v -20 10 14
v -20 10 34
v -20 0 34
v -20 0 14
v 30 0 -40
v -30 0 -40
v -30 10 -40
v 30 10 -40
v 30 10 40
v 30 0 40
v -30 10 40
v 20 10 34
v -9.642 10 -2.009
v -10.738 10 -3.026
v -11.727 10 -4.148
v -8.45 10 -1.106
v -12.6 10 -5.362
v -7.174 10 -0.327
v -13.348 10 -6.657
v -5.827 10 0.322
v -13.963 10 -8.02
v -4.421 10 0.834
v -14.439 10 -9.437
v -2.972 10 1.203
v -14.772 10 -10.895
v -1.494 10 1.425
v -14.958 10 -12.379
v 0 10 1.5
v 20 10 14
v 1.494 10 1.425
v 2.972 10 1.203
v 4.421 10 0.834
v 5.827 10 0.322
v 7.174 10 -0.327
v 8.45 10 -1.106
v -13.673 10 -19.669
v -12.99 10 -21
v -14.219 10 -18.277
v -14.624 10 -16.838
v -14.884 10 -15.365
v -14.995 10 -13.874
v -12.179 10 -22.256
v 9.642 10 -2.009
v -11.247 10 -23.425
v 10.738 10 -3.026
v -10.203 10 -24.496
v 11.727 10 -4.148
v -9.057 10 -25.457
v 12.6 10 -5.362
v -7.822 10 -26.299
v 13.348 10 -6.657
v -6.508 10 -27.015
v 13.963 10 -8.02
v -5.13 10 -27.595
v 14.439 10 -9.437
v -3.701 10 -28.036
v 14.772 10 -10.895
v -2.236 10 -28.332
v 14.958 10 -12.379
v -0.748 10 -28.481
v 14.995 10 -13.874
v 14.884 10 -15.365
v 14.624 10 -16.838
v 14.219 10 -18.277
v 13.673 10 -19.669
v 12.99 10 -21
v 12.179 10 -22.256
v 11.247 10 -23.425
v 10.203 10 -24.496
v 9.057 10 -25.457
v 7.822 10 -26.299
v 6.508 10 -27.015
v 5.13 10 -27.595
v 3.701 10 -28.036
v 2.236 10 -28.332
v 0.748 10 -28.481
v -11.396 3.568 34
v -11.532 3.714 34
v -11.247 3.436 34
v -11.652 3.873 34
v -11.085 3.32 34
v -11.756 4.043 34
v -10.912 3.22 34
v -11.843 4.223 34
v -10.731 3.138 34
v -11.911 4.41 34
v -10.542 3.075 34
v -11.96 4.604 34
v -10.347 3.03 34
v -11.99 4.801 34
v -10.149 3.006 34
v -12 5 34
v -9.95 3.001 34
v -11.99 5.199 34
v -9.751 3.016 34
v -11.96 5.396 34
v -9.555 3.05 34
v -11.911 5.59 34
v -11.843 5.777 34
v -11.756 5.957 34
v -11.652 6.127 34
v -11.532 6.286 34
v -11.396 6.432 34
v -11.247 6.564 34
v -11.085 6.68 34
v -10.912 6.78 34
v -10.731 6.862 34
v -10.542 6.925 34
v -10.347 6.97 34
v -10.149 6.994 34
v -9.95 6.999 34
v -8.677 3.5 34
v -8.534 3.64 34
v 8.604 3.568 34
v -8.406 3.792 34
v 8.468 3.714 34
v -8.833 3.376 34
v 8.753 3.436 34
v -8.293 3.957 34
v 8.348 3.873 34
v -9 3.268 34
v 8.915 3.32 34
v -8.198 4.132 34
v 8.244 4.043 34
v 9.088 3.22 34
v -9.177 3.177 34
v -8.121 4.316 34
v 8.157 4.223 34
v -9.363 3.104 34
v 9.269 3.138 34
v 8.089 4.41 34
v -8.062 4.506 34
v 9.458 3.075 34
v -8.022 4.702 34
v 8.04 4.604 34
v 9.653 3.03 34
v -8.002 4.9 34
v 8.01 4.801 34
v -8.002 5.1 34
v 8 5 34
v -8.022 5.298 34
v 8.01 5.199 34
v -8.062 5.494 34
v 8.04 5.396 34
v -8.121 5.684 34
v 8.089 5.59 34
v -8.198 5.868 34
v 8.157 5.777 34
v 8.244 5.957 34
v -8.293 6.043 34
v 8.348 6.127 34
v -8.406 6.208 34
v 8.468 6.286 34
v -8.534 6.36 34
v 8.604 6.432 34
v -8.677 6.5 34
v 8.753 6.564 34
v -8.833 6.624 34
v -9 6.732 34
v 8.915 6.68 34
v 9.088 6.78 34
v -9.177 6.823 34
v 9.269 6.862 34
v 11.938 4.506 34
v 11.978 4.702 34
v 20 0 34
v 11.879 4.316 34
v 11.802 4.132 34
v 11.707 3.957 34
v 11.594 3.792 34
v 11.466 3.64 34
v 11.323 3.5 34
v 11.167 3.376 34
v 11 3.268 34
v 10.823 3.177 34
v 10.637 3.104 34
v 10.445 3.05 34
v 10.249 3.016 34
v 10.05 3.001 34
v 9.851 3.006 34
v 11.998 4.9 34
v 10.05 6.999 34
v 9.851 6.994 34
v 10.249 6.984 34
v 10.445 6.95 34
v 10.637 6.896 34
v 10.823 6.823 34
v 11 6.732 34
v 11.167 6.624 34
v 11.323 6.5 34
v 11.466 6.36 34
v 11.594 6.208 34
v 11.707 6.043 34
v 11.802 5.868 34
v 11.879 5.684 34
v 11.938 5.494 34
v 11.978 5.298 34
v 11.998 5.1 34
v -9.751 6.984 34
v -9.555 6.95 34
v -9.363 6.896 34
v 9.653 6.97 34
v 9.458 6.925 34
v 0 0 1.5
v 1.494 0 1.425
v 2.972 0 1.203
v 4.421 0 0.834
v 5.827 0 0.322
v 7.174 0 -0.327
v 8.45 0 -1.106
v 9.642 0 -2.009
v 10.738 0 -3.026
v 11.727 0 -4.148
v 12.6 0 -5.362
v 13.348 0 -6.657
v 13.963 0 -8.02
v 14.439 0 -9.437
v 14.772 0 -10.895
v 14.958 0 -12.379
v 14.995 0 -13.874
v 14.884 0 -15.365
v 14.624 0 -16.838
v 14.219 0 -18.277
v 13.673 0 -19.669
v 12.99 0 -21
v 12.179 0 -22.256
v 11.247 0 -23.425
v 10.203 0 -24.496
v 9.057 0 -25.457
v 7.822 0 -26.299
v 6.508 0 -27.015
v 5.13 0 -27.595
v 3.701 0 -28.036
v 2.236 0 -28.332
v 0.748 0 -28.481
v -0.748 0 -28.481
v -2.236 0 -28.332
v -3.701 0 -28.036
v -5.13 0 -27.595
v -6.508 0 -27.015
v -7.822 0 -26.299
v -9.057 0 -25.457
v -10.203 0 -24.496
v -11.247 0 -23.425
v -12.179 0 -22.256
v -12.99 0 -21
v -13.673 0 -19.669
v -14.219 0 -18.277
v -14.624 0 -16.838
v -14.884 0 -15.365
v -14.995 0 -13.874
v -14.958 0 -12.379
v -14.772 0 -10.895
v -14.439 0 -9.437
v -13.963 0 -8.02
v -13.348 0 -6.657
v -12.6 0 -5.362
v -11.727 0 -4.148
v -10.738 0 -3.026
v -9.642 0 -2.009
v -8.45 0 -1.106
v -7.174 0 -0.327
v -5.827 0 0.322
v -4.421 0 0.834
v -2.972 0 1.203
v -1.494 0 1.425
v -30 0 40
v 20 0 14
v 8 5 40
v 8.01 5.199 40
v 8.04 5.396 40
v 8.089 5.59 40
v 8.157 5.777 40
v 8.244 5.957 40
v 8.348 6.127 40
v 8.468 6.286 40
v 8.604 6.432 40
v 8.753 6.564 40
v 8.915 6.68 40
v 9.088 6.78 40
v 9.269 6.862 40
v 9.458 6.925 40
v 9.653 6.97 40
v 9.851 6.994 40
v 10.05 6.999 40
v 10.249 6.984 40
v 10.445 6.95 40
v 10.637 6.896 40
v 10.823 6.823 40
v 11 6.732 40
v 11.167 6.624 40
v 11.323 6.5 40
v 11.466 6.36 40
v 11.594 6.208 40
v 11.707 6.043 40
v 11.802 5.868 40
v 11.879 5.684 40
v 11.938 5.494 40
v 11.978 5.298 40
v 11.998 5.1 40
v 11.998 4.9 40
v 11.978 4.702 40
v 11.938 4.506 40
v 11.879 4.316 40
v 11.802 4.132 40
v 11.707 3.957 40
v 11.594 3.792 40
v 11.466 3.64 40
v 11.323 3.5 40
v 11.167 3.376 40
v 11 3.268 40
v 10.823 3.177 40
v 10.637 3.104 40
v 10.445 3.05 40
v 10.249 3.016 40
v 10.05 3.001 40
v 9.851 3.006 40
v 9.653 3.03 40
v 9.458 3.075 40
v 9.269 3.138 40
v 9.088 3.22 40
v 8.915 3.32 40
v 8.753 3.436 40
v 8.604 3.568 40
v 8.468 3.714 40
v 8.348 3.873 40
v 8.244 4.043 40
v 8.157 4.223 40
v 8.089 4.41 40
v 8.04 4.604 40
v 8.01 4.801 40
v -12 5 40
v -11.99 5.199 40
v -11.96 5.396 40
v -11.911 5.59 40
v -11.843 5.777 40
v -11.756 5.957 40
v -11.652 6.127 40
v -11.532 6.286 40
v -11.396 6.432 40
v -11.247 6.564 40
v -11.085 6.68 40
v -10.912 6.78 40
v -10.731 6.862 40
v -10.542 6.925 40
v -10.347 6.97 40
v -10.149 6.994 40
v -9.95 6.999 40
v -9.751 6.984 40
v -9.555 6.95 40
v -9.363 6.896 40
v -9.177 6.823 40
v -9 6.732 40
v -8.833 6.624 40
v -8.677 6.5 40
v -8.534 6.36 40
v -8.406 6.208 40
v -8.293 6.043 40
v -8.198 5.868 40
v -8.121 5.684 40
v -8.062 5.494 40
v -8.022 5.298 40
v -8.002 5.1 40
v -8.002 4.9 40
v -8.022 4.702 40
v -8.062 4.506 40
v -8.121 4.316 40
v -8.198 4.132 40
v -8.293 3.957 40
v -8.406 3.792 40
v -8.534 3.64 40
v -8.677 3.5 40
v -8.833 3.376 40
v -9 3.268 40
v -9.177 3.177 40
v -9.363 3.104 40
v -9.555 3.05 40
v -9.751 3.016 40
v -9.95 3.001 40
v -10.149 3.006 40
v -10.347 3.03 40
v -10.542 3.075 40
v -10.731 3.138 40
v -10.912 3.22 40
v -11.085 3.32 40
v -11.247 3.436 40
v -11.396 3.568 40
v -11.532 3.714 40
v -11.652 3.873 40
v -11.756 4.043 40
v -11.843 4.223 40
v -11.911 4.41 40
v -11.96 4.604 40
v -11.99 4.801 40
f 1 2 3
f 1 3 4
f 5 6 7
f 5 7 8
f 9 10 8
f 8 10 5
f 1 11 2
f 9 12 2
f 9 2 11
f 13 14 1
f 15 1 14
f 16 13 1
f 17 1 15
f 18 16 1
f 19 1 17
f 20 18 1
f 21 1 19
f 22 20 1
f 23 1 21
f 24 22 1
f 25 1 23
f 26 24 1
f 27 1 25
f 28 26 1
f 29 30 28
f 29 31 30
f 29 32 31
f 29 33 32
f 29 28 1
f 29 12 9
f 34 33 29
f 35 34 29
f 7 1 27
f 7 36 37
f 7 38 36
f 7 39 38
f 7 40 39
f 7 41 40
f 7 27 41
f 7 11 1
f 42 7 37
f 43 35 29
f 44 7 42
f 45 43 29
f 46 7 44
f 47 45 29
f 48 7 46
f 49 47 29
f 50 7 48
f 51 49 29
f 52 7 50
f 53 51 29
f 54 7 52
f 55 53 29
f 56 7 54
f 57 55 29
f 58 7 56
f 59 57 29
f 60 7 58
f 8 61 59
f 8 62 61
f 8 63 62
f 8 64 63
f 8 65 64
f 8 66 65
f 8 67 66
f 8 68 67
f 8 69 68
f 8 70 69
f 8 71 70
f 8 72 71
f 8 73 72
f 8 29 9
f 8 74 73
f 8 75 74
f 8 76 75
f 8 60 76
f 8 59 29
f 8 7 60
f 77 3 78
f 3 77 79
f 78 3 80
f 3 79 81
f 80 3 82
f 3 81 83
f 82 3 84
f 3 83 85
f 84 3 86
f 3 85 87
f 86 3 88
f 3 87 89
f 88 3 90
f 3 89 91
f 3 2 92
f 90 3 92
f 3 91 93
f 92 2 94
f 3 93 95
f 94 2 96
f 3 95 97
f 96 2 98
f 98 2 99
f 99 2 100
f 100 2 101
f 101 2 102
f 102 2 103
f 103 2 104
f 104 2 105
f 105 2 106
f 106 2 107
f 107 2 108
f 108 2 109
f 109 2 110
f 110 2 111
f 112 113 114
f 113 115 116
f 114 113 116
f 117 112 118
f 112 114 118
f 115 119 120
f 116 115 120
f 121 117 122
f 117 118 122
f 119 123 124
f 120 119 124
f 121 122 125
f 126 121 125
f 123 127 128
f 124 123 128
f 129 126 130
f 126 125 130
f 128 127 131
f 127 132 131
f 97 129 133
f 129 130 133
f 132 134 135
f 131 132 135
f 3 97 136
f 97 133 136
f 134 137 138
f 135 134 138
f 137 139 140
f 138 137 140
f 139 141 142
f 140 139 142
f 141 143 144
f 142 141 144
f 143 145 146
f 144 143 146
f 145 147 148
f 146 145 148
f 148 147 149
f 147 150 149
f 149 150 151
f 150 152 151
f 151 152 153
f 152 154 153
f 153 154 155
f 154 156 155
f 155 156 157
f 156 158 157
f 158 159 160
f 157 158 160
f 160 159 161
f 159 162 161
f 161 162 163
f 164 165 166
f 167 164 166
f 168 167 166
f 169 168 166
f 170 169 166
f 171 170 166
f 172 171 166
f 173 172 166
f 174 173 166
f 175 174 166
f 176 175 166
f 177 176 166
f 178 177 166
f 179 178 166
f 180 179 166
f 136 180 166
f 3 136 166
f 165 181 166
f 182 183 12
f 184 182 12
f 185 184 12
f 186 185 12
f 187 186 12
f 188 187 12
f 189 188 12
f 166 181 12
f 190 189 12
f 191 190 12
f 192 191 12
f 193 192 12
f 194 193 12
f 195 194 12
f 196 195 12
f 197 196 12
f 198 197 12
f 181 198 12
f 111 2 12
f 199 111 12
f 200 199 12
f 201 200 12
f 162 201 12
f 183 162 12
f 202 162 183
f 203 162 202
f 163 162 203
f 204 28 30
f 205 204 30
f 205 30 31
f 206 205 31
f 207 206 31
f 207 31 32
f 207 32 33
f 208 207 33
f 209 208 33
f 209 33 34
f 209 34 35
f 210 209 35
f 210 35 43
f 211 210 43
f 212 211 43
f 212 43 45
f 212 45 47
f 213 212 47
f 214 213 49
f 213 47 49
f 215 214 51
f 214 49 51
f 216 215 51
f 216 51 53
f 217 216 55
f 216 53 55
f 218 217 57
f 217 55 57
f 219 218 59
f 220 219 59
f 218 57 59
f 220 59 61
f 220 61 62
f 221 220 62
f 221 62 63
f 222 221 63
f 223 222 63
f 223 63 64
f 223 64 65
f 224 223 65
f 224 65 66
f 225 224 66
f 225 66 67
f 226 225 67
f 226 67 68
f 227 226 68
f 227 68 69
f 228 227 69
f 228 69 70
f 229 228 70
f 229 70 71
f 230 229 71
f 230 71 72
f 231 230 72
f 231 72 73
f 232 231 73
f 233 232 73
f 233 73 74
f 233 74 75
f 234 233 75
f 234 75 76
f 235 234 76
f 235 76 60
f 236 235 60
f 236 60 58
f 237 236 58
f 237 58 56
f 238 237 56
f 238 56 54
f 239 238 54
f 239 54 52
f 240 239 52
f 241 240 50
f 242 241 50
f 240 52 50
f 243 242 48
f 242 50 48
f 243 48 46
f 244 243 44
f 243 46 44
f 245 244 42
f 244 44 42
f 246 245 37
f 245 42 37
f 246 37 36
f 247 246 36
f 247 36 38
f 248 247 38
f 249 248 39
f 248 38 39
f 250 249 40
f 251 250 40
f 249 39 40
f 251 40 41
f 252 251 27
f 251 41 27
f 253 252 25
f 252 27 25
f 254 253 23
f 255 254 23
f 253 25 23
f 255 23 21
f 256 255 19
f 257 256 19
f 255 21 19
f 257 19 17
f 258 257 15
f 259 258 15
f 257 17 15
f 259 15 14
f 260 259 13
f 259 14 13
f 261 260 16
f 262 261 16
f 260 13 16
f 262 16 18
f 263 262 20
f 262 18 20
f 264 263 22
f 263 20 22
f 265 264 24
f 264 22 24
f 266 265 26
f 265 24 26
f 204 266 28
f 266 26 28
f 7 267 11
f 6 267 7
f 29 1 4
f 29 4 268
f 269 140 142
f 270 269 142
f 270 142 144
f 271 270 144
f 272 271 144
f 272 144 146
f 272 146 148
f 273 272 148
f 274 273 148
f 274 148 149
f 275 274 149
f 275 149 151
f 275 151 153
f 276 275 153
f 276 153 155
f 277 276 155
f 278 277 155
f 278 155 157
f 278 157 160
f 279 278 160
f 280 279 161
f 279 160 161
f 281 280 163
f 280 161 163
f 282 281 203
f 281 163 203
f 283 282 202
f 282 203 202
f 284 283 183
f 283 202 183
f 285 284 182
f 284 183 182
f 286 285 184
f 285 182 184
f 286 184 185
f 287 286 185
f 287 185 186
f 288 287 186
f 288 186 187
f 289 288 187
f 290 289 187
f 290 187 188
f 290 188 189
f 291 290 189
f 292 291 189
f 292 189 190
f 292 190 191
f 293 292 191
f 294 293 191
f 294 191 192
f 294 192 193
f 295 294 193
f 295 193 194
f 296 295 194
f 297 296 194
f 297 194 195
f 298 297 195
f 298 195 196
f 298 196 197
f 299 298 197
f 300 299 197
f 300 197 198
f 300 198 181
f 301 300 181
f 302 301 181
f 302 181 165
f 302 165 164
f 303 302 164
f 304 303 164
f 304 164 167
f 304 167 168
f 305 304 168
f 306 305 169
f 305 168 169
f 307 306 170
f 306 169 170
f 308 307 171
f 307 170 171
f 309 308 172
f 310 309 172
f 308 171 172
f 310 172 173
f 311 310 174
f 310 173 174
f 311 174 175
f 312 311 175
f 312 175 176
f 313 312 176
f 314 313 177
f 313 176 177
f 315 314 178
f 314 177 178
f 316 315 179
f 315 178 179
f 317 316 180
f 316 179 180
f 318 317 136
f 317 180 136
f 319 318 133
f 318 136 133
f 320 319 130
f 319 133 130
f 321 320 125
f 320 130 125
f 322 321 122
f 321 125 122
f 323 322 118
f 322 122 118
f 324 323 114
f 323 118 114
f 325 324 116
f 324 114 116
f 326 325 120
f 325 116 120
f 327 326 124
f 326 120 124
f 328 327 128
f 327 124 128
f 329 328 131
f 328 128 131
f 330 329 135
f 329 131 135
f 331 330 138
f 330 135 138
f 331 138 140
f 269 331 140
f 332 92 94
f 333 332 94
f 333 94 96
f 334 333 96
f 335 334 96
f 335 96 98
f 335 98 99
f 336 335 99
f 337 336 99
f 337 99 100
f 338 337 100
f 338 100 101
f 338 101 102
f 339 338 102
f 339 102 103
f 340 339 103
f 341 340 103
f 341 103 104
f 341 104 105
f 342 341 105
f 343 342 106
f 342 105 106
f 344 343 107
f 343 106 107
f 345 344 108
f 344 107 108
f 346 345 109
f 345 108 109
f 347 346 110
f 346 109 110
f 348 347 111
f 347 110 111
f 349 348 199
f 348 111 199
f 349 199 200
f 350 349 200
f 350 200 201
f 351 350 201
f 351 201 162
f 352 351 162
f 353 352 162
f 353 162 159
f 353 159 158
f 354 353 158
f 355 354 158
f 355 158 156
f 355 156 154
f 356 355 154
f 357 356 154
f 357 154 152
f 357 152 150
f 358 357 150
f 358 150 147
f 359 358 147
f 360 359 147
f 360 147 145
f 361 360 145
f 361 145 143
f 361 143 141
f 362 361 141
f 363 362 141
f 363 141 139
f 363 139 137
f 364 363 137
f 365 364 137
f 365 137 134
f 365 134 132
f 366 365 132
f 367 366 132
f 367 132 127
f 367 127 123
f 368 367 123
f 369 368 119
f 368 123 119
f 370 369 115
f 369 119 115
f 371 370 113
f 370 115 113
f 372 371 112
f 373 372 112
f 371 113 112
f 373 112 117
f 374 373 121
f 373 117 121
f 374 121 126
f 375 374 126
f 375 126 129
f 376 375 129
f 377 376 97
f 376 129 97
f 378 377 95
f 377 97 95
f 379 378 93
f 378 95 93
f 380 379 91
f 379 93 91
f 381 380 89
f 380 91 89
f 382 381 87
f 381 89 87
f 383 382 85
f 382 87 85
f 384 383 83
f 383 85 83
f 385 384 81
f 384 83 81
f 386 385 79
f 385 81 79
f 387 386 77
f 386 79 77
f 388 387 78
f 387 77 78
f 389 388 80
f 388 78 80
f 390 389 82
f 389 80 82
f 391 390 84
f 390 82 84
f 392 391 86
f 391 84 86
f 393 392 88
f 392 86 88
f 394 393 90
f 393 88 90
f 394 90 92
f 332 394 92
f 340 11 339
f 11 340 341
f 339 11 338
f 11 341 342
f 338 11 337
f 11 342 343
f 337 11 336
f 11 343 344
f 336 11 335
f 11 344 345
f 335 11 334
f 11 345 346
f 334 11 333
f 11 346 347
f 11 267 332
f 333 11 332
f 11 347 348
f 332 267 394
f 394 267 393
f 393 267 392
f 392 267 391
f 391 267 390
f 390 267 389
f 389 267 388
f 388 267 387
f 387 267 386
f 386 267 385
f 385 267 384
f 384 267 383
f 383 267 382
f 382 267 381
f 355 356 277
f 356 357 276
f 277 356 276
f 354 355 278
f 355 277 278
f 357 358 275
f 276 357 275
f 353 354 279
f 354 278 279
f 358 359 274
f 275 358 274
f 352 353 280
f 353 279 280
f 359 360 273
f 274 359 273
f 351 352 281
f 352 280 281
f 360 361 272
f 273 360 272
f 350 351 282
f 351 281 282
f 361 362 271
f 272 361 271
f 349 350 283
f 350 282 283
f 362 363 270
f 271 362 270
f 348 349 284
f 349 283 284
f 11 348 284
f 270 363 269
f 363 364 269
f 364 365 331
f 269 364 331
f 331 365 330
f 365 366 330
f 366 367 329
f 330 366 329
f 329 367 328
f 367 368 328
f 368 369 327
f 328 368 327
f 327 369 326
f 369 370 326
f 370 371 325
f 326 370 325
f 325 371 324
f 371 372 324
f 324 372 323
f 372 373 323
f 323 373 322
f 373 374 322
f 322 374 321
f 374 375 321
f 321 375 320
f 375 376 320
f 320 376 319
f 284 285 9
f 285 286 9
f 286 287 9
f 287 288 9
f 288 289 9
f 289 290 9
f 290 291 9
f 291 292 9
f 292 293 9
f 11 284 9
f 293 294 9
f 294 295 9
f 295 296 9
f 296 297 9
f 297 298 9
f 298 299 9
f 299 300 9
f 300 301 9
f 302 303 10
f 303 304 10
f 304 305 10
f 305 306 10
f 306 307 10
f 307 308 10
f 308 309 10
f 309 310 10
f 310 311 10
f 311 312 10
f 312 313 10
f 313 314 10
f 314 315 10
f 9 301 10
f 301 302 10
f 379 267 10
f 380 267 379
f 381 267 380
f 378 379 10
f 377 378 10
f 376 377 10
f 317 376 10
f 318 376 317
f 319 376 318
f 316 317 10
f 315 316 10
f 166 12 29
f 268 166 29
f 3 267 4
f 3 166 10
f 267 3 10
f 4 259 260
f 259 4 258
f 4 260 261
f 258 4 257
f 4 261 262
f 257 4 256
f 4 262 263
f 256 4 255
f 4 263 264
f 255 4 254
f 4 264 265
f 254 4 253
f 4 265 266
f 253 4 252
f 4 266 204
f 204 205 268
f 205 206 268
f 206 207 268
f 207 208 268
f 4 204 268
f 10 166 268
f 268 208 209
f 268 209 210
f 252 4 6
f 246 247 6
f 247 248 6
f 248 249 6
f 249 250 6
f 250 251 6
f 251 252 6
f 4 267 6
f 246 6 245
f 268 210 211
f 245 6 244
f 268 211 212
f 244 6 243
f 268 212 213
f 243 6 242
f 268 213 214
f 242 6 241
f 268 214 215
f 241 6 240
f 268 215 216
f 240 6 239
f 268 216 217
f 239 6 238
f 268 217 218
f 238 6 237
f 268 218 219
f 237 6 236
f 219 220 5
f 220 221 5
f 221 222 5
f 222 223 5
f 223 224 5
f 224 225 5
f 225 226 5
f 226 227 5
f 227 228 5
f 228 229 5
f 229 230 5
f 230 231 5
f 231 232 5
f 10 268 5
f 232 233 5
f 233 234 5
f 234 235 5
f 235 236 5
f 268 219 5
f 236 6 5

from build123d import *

# Parameters (mm, degrees)
SKETCH1_W           = 60
SKETCH1_H           = 80
BOSS_EXTRUDE1_DEPTH = 10
SKETCH2_R           = 15
CUT_EXTRUDE1_DEPTH  = 80
SKETCH3_W           = 40
SKETCH3_H           = 20
CUT_EXTRUDE2_DEPTH  = 80
SKETCH4_R           = 2
CUT_EXTRUDE3_DEPTH  = 10


with BuildPart() as part:
    # Sketch1 → Boss-Extrude1 (new body)
    with BuildSketch(Plane(origin=(0, 0, 0), x_dir=(1, 0, 0), z_dir=(0, 1, 0))):
        Rectangle(SKETCH1_W, SKETCH1_H)
    extrude(amount=BOSS_EXTRUDE1_DEPTH)

    # Sketch2 → Cut-Extrude1 (cut)
    with BuildSketch(Plane(origin=(0, 10, 0), x_dir=(1, 0, 0), z_dir=(0, 1, 0))):
        with Locations(Location((0, 13.5, 0), (0, 0, 270))):
            Circle(SKETCH2_R)
    extrude(amount=-CUT_EXTRUDE1_DEPTH, mode=Mode.SUBTRACT)

    # Sketch3 → Cut-Extrude2 (cut)
    with BuildSketch(Plane(origin=(0, 10, 0), x_dir=(1, 0, 0), z_dir=(0, 1, 0))):
        with Locations((0, -24)):
            Rectangle(SKETCH3_W, SKETCH3_H)
    extrude(amount=-CUT_EXTRUDE2_DEPTH, mode=Mode.SUBTRACT)

    # Sketch4 → Cut-Extrude3 (cut)
    with BuildSketch(Plane(origin=(0, 0, 34), x_dir=(-1, 0, 0), z_dir=(0, 0, -1))):
        with Locations((10, 5)):
            Circle(SKETCH4_R)
        with Locations((-10, 5)):
            Circle(SKETCH4_R)
    extrude(amount=-CUT_EXTRUDE3_DEPTH, mode=Mode.SUBTRACT)


solid = part.part
